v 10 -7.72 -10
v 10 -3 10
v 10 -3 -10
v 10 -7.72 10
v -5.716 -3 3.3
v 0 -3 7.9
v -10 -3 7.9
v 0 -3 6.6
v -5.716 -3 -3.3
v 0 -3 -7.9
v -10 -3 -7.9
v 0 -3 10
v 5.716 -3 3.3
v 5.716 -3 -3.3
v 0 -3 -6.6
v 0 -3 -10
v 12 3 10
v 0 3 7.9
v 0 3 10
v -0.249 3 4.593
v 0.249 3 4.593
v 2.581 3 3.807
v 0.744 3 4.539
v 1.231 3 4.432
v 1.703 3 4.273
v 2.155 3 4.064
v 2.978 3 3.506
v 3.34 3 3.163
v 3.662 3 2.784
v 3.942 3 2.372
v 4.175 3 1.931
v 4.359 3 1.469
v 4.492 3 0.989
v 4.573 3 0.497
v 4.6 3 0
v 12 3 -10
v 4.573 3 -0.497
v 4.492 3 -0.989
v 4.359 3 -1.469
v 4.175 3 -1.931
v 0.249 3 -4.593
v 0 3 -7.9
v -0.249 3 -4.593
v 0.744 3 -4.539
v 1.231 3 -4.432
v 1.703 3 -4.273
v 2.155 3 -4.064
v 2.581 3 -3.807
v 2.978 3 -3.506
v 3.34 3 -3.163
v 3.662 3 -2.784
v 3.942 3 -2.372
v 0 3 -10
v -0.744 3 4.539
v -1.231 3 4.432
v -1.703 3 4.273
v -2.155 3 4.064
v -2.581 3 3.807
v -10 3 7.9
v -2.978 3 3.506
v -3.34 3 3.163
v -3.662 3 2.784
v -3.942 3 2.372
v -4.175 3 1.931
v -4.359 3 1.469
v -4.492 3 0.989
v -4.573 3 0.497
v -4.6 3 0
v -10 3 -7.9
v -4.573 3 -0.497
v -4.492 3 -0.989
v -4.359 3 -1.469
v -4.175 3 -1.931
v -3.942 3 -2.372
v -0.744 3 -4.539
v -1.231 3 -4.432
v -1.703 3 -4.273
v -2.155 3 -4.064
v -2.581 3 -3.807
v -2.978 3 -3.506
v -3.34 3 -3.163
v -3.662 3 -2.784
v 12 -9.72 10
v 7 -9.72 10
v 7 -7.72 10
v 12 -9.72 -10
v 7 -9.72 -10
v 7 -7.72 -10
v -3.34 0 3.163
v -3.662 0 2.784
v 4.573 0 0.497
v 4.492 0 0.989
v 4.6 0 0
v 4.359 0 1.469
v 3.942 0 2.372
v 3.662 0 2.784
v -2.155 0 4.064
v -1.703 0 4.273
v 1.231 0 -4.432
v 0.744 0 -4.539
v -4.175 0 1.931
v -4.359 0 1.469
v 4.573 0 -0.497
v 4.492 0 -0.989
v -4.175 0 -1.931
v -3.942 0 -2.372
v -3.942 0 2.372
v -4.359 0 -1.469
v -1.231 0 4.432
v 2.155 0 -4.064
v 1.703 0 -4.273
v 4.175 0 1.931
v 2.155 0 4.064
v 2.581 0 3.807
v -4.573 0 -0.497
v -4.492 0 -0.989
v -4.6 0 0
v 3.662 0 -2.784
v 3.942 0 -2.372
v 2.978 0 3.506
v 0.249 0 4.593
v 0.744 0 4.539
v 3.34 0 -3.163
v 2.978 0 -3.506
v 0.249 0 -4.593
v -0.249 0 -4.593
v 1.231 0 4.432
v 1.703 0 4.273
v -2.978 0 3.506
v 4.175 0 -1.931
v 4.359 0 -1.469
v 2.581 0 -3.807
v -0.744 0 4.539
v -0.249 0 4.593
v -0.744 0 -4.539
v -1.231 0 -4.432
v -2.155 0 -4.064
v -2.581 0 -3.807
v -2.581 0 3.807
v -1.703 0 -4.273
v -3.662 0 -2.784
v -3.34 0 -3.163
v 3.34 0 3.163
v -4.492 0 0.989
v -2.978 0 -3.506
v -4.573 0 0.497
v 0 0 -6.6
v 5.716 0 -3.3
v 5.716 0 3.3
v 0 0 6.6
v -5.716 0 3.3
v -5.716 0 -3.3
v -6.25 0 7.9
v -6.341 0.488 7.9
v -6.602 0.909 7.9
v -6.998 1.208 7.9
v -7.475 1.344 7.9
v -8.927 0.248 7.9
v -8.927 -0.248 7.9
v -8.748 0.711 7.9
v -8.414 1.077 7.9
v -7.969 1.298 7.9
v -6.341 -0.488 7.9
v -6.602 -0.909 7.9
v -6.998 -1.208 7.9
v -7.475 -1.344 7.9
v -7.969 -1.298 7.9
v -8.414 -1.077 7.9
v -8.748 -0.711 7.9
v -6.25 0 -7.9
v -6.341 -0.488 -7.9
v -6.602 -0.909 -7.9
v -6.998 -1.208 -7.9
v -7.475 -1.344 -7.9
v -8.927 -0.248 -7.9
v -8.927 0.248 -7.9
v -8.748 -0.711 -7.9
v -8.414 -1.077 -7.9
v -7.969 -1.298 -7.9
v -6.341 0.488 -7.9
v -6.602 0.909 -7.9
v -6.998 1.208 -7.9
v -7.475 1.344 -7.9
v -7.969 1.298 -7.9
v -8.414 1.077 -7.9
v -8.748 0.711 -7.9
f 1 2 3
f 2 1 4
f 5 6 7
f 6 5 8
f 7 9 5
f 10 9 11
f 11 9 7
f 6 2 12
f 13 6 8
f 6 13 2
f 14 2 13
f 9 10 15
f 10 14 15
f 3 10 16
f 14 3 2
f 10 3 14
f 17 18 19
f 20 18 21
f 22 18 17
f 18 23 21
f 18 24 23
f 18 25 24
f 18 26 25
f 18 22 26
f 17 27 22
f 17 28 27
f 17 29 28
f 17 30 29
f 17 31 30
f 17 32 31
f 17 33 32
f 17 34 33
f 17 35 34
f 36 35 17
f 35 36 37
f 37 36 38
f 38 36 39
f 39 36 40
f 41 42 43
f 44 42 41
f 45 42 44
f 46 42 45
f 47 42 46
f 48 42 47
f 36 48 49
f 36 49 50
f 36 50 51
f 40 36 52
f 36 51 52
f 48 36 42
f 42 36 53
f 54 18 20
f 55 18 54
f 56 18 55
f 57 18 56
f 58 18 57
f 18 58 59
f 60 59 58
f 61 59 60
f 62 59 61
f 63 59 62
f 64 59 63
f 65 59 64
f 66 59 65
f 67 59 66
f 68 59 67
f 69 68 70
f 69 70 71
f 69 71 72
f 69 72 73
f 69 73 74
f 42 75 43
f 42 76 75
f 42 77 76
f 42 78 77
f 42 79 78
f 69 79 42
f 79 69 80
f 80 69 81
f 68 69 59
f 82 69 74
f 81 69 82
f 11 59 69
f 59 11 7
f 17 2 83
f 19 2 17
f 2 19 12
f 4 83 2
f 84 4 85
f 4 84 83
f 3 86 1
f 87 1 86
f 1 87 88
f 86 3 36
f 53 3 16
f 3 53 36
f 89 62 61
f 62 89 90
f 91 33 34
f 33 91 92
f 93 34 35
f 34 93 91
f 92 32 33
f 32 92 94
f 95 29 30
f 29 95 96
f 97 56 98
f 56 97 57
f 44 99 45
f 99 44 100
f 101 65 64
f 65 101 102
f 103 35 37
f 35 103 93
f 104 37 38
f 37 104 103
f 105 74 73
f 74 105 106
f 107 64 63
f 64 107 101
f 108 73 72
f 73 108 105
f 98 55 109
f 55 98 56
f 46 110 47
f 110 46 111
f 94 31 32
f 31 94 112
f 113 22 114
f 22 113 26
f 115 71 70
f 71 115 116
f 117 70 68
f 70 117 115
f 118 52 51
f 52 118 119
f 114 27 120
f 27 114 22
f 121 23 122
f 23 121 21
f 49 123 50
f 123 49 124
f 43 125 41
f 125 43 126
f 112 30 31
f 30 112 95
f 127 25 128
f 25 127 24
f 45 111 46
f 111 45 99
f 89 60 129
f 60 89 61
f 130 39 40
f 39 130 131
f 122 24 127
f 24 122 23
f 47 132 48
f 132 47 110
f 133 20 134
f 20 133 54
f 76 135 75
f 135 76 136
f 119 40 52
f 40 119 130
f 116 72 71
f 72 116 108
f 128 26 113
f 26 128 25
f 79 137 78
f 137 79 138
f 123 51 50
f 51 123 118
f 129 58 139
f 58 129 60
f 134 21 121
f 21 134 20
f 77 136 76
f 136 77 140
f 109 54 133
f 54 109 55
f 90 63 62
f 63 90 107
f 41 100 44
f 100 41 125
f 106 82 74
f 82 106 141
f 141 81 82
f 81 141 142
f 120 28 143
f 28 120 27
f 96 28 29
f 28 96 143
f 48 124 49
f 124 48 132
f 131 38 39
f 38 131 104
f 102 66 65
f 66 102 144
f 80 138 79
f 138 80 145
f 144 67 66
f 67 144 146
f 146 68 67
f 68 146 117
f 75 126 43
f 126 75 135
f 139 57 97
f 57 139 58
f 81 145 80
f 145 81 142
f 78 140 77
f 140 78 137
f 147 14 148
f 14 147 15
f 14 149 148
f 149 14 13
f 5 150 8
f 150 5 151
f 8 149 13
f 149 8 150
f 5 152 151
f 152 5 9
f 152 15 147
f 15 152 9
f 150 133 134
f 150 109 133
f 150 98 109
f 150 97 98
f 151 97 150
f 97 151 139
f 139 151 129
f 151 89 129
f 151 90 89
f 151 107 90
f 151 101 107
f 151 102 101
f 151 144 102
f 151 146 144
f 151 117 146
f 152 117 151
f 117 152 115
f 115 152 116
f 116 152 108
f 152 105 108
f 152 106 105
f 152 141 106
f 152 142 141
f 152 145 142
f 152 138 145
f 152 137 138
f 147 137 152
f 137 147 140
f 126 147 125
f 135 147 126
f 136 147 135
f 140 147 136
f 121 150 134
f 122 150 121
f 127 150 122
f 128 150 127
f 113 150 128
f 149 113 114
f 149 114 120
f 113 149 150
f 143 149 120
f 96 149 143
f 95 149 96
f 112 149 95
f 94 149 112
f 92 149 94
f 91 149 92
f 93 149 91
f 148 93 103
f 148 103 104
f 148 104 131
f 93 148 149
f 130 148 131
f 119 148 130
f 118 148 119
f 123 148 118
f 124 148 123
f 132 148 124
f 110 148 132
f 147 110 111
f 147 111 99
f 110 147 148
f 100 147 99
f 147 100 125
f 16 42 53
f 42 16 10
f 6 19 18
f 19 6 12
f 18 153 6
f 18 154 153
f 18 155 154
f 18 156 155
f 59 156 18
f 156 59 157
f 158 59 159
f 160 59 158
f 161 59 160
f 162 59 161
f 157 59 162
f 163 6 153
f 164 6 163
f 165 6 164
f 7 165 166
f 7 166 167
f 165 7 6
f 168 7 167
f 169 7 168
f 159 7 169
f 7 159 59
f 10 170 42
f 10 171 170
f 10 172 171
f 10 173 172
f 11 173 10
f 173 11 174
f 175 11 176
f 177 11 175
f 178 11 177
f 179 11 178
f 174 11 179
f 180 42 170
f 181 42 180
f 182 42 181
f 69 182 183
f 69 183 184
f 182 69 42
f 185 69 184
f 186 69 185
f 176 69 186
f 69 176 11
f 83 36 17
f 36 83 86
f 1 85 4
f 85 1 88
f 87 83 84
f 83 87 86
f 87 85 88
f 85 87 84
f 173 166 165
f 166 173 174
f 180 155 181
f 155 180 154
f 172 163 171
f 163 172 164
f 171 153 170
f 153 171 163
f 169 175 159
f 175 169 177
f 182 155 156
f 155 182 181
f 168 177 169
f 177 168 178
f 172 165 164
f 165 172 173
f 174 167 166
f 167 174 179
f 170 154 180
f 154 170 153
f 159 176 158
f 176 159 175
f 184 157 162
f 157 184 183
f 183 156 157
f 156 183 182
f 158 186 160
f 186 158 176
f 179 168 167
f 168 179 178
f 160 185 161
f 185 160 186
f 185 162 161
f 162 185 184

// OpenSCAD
$fa=0.5; // default minimum facet angle is now 0.5
$fs=0.5; // default minimum facet size is now 0.5 mm

bolt_height = 5.72;
wall_thickness = 2;
base_height = 6;

module side() {
    union() {
      translate([10, -10, -base_height/2]) cube([2, 20, bolt_height + wall_thickness + base_height/2]);
      translate([7,-10,bolt_height + wall_thickness]) cube([5, 20, 2]);
    }
}

module main() {
	difference() 
	{
	  cube([20, 20, base_height], center=true);
	  cylinder(r=4.6, h=10, center=true);
	  rotate([0,0,30]) cylinder(r=6.6, h=20, $fn=6);
	  translate([-11, -11, -base_height/2-1]) cube([11, 3, base_height + 2]);
	  translate([-11, 8, -base_height/2-1]) cube([11, 3, base_height + 2]);
	  translate([-11,7.9,-6]) cube([11, 0.1, 12]);
	  translate([-11,-8,-6]) cube([11, 0.1, 12]);
	}

	side();
}

module slide() {
	translate([-10, -10, -base_height/2]) cube([10, 2, base_height]);
	translate([-10, 8, -base_height/2]) cube([10, 2, base_height]);
	rotate([0,0,180]) side();
}

module make(what) {
	// rotation for better printing
	rotate([what=="main"?90:0,what=="main"?0:-90,0])
	difference() {
		if (what == "main") {
			main();
		} else {
			slide();
		}
		translate([-7.6,0,0]) rotate([90,0,0]) cylinder(d=what=="main" ? 2.7 : 3.1, h = 22, center=true);
	}	
}

make("main");
